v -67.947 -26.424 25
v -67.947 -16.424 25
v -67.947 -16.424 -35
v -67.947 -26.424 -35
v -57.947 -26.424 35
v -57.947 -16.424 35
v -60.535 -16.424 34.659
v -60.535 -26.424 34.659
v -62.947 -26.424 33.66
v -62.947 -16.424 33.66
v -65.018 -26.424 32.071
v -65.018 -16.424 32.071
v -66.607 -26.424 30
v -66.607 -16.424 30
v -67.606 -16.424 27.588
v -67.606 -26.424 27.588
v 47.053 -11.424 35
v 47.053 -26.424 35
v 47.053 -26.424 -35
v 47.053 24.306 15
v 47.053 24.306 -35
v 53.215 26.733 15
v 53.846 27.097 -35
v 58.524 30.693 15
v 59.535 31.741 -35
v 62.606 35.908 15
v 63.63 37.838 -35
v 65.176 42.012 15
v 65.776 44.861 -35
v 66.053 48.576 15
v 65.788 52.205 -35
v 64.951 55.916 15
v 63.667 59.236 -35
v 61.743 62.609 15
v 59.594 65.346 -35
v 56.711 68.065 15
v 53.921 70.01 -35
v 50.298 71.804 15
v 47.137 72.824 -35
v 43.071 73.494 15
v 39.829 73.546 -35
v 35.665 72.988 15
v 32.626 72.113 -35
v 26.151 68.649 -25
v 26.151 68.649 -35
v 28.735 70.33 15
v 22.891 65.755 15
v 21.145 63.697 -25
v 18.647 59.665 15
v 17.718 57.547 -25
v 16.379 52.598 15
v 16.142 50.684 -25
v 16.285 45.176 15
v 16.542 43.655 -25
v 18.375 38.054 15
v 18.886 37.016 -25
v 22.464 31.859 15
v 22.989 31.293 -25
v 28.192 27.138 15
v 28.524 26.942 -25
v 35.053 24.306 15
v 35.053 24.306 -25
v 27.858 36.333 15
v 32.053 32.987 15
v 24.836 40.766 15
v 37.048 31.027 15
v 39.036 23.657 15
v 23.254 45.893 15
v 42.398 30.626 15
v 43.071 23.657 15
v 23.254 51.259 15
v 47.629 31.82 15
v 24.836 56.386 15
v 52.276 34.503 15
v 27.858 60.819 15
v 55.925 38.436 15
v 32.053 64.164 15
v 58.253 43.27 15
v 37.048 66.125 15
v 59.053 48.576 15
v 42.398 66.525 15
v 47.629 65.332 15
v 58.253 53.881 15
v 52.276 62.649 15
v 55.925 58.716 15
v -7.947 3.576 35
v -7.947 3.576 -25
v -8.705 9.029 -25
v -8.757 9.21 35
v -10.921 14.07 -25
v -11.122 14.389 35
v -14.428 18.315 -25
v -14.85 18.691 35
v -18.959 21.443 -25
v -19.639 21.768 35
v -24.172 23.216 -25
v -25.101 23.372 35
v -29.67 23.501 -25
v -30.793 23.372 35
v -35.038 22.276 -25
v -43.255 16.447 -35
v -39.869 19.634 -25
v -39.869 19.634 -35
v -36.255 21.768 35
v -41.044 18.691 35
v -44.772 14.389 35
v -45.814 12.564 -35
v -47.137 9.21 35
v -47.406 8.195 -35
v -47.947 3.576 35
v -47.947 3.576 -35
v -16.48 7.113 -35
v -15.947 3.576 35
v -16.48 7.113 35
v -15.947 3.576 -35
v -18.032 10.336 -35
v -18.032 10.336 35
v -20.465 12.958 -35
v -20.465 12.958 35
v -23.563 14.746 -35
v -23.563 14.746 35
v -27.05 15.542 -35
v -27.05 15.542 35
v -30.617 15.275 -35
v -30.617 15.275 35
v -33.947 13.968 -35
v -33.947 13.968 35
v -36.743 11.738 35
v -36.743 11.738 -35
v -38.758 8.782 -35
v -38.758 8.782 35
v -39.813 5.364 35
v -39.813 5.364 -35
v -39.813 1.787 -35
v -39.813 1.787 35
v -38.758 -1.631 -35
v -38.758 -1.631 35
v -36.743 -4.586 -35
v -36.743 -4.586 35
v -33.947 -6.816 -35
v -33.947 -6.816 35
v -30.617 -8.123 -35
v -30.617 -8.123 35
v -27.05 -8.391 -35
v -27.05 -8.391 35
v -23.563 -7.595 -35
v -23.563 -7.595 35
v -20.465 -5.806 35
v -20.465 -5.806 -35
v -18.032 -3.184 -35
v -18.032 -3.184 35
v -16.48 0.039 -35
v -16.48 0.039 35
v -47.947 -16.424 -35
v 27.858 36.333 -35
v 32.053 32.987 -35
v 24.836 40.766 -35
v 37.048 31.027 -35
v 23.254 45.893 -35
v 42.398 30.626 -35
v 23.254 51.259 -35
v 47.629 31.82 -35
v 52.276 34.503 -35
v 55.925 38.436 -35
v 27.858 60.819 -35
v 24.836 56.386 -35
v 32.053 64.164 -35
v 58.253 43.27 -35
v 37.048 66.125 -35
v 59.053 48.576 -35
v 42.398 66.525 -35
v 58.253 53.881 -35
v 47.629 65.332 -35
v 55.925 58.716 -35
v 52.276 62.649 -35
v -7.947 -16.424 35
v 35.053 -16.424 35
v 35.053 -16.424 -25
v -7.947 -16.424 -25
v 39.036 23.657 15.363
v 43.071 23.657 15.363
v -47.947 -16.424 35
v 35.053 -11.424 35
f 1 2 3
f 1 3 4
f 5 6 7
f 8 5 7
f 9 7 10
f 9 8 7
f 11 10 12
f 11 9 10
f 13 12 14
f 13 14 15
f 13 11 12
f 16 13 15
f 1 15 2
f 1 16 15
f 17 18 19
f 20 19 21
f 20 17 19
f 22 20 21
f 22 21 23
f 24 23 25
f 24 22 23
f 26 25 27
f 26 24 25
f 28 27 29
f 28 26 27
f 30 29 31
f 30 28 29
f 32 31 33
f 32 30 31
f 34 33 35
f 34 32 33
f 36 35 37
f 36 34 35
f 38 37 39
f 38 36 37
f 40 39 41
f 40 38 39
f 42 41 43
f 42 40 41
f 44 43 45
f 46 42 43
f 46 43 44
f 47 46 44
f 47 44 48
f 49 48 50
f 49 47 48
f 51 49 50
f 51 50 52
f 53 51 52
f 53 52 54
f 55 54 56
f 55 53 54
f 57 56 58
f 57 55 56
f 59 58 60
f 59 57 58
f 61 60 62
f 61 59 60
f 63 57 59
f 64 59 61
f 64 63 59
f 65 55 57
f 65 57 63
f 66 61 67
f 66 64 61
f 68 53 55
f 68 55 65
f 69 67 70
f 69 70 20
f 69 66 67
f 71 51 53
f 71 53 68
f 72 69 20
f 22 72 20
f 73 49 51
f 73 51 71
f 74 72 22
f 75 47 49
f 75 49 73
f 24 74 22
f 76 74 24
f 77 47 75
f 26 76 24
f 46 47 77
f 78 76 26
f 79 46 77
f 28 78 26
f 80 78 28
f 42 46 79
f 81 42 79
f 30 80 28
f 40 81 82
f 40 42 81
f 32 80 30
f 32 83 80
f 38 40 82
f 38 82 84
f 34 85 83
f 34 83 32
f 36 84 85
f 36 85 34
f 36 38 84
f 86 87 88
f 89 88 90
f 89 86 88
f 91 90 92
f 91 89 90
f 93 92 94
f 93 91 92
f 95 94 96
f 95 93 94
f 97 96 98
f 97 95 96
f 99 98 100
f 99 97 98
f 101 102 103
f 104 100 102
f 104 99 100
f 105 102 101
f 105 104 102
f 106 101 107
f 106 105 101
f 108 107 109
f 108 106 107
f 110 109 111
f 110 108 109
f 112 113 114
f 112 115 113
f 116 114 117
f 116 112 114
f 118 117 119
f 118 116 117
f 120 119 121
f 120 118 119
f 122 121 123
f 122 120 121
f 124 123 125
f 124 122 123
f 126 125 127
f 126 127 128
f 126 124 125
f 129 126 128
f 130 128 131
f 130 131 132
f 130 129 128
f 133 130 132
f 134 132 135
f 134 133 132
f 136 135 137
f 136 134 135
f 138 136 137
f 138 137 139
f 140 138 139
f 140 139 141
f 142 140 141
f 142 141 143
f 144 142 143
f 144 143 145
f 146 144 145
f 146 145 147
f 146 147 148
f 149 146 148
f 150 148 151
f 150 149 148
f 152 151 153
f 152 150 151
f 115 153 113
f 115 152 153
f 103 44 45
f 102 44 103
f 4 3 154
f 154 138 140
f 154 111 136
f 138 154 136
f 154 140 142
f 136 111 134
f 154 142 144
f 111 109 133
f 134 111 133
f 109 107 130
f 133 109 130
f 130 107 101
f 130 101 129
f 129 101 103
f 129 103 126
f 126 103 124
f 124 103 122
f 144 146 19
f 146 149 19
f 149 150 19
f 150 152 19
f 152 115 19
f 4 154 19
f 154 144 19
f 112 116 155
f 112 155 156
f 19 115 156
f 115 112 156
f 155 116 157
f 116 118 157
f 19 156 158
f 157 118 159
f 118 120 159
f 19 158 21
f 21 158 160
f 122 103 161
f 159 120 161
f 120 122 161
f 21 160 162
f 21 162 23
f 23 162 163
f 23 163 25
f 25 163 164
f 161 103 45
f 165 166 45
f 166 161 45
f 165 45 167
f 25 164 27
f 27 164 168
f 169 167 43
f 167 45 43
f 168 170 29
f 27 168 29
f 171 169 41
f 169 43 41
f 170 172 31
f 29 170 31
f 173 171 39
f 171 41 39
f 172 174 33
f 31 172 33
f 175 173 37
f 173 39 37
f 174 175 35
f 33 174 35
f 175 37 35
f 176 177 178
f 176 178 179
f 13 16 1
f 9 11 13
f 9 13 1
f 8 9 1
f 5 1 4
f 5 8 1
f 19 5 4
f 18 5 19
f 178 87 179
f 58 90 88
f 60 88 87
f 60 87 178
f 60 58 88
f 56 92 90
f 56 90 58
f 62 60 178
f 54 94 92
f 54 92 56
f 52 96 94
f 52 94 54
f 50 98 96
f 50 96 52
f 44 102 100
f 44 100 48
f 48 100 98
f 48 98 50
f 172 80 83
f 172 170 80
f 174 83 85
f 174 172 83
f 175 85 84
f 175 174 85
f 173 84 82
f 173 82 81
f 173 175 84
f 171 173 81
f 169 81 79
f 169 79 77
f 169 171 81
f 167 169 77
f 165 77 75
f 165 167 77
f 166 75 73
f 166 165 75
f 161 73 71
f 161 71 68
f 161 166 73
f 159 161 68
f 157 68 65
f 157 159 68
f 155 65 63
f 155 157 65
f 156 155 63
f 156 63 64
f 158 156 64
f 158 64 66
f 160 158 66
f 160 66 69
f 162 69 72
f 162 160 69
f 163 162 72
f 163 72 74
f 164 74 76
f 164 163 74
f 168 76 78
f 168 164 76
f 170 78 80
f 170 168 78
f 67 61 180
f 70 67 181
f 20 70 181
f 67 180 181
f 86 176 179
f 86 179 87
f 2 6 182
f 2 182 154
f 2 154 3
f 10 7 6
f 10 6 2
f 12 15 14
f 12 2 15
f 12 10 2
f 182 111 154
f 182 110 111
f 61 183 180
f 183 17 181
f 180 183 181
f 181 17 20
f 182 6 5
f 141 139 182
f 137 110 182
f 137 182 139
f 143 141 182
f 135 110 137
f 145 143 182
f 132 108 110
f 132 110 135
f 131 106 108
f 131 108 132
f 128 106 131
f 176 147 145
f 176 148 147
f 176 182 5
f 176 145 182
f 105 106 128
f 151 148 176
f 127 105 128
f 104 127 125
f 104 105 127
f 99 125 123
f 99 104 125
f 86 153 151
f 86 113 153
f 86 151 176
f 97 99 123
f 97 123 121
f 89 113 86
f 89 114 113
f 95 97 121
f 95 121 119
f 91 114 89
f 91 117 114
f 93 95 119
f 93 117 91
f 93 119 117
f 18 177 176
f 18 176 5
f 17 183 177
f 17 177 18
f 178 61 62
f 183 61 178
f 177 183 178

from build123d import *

# Parameters (mm, degrees)
SKETCH2_R           = 12
SKETCH2_R_2         = 18
BOSS_EXTRUDE2_DEPTH = 35
BOSS_EXTRUDE5_START = 10
BOSS_EXTRUDE5_DEPTH = 10
FILLET2_R           = 10
SKETCH4_R           = 18
CUT_EXTRUDE1_DEPTH  = 20
CUT_EXTRUDE4_DEPTH  = 20


with BuildPart() as part:
    # Sketch2 → Boss-Extrude2 (new, symmetric)
    with BuildSketch(Plane.XY):
        with BuildLine():
            Line((47.053173242, -26.424193548), (47.053173242, 24.306484253))
            ThreePointArc((47.053173242, 24.306484253), (41.053173242, 73.575806452), (35.053173242, 24.306484253))
            Line((35.053173242, 24.306484253), (35.053173242, -16.424193548))
            Line((35.053173242, -16.424193548), (-7.946826758, -16.424193548))
            Line((-7.946826758, -16.424193548), (-7.946826758, 3.575806452))
            ThreePointArc((-7.946826758, 3.575806452), (-27.946826758, 23.575806452), (-47.946826758, 3.575806452))
            Line((-47.946826758, 3.575806452), (-47.946826758, -16.424193548))
            Line((-47.946826758, -16.424193548), (-67.946826758, -16.424193548))
            Line((-67.946826758, -16.424193548), (-67.946826758, -26.424193548))
            Line((-67.946826758, -26.424193548), (47.053173242, -26.424193548))
        make_face()
        with Locations((-27.946826758, 3.575806452)):
            Circle(SKETCH2_R, mode=Mode.SUBTRACT)
        with Locations((41.053173242, 48.575806452)):
            Circle(SKETCH2_R_2, mode=Mode.SUBTRACT)
    extrude(amount=BOSS_EXTRUDE2_DEPTH, both=True)

    # Sketch3 → Boss-Extrude5 (add)
    with BuildSketch(Plane.XY.offset(-35).offset(BOSS_EXTRUDE5_START)):
        with BuildLine():
            ThreePointArc((35.053173242, 24.306484253), (16.542288051, 43.654779406), (26.150658834, 68.648550766))
            Line((26.150658834, 68.648550766), (-39.868838285, 19.634001903))
            ThreePointArc((-39.868838285, 19.634001903), (-18.959063703, 21.442538533), (-7.946826758, 3.575806452))
            Line((-7.946826758, 3.575806452), (-7.946826758, -16.424193548))
            Line((-7.946826758, -16.424193548), (35.053173242, -16.424193548))
            Line((35.053173242, -16.424193548), (35.053173242, 24.306484253))
        make_face()
    extrude(amount=-BOSS_EXTRUDE5_DEPTH)

    # Fillet2
    fillet2_edges = [part.edges().sort_by_distance(p)[0] for p in [
        (-67.946826758, -21.424193548, 35),
    ]]
    fillet(fillet2_edges, radius=FILLET2_R)

    # Sketch4 → Cut-Extrude1 (cut)
    with BuildSketch(Plane.XY.offset(35)):
        with BuildLine():
            ThreePointArc((35.053173242, 24.306484253), (41.053173242, 23.575806452), (47.053173242, 24.306484253))
            ThreePointArc((47.053173242, 24.306484253), (60.738192927, 33.164771444), (66.053173242, 48.575806452))
            ThreePointArc((66.053173242, 48.575806452), (25.642138234, 68.260826137), (35.053173242, 24.306484253))
        make_face()
        with Locations((41.053173242, 48.575806452)):
            Circle(SKETCH4_R, mode=Mode.SUBTRACT)
    extrude(amount=-CUT_EXTRUDE1_DEPTH, mode=Mode.SUBTRACT)

    # Sketch5 → Cut-Extrude4 (cut)
    with BuildSketch(Plane(origin=(47.053173242, 0, 0), x_dir=(0, 0, -1), z_dir=(1, 0, 0))):
        Polygon((-35, 24.306484253), (-35, -11.424193548), (-15, 24.306484253), align=None)
    extrude(amount=-CUT_EXTRUDE4_DEPTH, mode=Mode.SUBTRACT)


solid = part.part
